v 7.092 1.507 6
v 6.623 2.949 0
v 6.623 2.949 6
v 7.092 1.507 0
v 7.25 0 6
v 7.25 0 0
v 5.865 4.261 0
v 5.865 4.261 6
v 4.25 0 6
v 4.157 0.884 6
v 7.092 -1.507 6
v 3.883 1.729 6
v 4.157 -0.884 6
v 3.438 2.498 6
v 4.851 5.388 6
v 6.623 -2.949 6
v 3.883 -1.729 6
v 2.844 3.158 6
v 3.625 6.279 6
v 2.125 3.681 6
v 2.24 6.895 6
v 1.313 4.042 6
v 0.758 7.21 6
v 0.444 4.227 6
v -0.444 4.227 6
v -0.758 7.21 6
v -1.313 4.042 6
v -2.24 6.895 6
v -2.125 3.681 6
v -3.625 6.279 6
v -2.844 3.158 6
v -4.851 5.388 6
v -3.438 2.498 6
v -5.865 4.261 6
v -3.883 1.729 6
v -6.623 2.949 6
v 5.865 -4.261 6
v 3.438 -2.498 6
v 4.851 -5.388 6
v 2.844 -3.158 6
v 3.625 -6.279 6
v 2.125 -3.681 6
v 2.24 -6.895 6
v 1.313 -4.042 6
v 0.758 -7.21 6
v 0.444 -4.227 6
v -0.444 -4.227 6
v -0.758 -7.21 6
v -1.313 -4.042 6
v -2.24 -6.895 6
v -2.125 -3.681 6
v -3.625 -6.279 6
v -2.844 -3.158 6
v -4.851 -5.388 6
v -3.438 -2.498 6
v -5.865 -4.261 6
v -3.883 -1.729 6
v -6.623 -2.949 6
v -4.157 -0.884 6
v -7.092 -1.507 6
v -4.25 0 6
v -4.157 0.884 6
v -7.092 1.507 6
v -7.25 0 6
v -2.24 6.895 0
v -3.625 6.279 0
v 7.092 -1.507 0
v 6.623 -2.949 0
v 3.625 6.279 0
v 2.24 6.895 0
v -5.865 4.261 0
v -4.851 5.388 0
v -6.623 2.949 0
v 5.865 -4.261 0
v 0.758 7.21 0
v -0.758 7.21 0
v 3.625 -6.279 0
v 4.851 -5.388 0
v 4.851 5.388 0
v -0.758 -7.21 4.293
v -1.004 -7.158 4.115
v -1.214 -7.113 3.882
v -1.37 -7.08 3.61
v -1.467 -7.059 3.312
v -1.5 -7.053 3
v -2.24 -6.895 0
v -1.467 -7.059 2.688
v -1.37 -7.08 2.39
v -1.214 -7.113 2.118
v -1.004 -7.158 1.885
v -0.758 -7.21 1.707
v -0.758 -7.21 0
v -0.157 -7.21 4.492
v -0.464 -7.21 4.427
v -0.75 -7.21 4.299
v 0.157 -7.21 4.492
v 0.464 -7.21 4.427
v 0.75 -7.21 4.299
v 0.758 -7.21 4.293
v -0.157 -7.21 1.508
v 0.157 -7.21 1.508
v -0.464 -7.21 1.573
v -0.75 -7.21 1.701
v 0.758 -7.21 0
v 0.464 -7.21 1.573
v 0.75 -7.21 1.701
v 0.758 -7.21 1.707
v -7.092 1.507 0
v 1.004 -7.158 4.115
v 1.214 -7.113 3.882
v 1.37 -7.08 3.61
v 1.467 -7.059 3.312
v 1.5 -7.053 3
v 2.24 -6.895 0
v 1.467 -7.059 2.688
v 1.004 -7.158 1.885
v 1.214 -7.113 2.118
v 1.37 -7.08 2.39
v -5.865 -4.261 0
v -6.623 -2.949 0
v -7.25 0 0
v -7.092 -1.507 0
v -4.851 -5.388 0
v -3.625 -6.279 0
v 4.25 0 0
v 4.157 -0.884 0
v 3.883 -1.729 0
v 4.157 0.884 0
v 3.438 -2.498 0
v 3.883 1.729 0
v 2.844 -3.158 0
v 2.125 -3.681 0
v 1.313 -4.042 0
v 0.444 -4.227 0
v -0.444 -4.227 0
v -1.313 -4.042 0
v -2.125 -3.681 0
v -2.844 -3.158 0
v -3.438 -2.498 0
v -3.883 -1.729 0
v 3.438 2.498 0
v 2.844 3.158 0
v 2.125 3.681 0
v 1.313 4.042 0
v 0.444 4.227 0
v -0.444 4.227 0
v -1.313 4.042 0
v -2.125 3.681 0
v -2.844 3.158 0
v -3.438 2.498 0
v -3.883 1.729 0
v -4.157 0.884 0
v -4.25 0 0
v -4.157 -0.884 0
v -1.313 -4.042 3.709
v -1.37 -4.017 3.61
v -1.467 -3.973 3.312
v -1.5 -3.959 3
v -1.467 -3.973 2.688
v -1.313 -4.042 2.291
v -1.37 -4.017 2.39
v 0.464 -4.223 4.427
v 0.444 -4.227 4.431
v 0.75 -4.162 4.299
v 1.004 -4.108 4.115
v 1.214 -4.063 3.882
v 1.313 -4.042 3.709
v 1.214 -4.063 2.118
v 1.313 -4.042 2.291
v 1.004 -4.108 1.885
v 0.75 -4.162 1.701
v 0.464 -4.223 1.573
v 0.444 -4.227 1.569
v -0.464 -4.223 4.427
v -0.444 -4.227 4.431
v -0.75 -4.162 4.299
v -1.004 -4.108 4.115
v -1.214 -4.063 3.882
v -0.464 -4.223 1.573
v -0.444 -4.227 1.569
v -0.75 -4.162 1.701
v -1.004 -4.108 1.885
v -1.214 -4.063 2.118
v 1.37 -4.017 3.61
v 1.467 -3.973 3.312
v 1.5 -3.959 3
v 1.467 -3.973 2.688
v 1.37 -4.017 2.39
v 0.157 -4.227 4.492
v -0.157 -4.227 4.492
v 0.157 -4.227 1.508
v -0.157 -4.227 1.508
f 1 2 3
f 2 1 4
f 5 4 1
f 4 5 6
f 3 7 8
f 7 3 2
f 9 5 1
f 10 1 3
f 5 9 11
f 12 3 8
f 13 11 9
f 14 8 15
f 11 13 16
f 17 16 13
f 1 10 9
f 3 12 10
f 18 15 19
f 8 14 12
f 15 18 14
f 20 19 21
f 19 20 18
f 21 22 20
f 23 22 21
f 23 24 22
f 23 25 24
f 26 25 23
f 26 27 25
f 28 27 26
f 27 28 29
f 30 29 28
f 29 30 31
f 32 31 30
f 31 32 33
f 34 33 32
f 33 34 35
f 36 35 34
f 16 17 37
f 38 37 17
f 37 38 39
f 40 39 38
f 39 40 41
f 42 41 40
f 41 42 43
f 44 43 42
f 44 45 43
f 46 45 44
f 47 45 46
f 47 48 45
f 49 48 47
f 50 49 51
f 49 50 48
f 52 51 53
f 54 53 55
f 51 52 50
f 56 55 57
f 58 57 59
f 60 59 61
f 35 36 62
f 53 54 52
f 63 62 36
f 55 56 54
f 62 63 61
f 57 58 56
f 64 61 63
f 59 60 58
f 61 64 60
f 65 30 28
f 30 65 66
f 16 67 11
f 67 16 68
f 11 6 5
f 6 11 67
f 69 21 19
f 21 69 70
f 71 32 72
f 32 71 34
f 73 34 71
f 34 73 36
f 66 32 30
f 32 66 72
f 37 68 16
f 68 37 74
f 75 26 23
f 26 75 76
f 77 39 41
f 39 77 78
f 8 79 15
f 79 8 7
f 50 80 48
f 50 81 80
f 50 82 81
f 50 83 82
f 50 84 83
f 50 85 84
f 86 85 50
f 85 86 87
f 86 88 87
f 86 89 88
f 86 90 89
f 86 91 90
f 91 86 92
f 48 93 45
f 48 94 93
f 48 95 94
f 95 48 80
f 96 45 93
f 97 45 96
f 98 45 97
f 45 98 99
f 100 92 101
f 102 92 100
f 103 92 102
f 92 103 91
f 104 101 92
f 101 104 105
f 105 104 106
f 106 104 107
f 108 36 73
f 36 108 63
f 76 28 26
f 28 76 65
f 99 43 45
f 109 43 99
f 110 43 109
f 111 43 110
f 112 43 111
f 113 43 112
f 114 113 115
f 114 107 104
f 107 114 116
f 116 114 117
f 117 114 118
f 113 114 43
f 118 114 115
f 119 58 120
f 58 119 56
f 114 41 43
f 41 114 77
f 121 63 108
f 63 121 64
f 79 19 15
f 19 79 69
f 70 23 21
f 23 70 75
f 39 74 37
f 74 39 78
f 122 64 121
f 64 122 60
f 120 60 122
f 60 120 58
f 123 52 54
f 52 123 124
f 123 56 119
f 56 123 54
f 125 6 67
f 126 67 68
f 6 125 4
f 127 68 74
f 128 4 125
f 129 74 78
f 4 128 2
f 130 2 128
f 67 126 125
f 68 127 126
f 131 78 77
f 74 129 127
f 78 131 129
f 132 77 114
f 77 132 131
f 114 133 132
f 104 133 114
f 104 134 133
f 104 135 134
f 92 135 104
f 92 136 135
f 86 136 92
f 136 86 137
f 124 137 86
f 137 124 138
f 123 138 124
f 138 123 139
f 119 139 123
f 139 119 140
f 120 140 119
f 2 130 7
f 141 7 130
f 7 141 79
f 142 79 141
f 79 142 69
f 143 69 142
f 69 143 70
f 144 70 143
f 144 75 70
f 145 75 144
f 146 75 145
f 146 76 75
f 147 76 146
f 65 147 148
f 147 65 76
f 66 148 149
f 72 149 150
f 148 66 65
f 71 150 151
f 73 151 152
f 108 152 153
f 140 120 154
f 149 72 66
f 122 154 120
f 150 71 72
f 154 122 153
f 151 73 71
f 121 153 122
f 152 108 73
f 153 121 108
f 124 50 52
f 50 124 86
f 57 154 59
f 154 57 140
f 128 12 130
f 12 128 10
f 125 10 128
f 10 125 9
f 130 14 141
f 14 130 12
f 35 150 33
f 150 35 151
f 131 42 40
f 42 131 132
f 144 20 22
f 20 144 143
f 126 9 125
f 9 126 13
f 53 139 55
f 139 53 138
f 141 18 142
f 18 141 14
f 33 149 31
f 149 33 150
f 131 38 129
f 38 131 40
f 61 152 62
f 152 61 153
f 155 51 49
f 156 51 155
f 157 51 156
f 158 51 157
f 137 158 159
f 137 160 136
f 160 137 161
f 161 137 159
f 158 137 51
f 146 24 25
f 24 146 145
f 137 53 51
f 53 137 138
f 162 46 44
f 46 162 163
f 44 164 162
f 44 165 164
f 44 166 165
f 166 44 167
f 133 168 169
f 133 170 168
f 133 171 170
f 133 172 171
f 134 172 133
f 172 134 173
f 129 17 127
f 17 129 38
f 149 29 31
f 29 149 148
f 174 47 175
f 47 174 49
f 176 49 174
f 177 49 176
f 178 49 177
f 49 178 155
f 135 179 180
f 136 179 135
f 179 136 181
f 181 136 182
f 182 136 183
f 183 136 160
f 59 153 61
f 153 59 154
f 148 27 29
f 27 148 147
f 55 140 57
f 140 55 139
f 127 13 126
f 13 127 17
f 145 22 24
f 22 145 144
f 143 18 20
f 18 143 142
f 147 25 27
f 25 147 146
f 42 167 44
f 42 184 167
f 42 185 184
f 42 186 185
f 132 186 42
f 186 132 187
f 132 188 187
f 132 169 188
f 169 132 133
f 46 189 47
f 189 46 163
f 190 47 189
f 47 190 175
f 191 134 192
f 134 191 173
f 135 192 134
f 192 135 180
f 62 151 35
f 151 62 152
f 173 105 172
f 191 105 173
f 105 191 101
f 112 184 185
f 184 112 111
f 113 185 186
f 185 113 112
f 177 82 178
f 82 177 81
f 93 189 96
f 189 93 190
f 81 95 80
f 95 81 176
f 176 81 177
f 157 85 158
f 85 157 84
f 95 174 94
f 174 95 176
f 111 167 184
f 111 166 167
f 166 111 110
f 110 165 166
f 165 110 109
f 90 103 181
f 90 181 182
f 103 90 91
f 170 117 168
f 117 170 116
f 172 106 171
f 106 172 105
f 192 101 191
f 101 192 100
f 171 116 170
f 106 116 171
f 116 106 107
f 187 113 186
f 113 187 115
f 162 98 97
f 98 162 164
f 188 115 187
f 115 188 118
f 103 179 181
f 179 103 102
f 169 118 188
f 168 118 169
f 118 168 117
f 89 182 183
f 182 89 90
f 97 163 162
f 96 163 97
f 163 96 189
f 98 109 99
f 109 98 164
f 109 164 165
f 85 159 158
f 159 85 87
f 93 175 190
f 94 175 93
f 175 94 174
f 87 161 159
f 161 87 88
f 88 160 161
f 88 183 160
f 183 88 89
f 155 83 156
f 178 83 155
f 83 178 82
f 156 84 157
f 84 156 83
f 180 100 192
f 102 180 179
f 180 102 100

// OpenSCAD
$fn = 30;
screw_radius = 1.5;
inner_radius = 4.25;
outer_radius = 7.25;

part_height = 6;

module ring(inner_radius,outer_radius) {
    difference() {
        cylinder(r=outer_radius, h=part_height);
        cylinder(r=inner_radius, h=part_height);
    }
}



module screw_collar() {
    difference() {
        ring(inner_radius,outer_radius);
        translate([0,0,part_height/2])
       { 
           rotate([90,0,0]) {
               cylinder(r=screw_radius,h=part_height*2);
           }
       }
    }
}

screw_collar();
